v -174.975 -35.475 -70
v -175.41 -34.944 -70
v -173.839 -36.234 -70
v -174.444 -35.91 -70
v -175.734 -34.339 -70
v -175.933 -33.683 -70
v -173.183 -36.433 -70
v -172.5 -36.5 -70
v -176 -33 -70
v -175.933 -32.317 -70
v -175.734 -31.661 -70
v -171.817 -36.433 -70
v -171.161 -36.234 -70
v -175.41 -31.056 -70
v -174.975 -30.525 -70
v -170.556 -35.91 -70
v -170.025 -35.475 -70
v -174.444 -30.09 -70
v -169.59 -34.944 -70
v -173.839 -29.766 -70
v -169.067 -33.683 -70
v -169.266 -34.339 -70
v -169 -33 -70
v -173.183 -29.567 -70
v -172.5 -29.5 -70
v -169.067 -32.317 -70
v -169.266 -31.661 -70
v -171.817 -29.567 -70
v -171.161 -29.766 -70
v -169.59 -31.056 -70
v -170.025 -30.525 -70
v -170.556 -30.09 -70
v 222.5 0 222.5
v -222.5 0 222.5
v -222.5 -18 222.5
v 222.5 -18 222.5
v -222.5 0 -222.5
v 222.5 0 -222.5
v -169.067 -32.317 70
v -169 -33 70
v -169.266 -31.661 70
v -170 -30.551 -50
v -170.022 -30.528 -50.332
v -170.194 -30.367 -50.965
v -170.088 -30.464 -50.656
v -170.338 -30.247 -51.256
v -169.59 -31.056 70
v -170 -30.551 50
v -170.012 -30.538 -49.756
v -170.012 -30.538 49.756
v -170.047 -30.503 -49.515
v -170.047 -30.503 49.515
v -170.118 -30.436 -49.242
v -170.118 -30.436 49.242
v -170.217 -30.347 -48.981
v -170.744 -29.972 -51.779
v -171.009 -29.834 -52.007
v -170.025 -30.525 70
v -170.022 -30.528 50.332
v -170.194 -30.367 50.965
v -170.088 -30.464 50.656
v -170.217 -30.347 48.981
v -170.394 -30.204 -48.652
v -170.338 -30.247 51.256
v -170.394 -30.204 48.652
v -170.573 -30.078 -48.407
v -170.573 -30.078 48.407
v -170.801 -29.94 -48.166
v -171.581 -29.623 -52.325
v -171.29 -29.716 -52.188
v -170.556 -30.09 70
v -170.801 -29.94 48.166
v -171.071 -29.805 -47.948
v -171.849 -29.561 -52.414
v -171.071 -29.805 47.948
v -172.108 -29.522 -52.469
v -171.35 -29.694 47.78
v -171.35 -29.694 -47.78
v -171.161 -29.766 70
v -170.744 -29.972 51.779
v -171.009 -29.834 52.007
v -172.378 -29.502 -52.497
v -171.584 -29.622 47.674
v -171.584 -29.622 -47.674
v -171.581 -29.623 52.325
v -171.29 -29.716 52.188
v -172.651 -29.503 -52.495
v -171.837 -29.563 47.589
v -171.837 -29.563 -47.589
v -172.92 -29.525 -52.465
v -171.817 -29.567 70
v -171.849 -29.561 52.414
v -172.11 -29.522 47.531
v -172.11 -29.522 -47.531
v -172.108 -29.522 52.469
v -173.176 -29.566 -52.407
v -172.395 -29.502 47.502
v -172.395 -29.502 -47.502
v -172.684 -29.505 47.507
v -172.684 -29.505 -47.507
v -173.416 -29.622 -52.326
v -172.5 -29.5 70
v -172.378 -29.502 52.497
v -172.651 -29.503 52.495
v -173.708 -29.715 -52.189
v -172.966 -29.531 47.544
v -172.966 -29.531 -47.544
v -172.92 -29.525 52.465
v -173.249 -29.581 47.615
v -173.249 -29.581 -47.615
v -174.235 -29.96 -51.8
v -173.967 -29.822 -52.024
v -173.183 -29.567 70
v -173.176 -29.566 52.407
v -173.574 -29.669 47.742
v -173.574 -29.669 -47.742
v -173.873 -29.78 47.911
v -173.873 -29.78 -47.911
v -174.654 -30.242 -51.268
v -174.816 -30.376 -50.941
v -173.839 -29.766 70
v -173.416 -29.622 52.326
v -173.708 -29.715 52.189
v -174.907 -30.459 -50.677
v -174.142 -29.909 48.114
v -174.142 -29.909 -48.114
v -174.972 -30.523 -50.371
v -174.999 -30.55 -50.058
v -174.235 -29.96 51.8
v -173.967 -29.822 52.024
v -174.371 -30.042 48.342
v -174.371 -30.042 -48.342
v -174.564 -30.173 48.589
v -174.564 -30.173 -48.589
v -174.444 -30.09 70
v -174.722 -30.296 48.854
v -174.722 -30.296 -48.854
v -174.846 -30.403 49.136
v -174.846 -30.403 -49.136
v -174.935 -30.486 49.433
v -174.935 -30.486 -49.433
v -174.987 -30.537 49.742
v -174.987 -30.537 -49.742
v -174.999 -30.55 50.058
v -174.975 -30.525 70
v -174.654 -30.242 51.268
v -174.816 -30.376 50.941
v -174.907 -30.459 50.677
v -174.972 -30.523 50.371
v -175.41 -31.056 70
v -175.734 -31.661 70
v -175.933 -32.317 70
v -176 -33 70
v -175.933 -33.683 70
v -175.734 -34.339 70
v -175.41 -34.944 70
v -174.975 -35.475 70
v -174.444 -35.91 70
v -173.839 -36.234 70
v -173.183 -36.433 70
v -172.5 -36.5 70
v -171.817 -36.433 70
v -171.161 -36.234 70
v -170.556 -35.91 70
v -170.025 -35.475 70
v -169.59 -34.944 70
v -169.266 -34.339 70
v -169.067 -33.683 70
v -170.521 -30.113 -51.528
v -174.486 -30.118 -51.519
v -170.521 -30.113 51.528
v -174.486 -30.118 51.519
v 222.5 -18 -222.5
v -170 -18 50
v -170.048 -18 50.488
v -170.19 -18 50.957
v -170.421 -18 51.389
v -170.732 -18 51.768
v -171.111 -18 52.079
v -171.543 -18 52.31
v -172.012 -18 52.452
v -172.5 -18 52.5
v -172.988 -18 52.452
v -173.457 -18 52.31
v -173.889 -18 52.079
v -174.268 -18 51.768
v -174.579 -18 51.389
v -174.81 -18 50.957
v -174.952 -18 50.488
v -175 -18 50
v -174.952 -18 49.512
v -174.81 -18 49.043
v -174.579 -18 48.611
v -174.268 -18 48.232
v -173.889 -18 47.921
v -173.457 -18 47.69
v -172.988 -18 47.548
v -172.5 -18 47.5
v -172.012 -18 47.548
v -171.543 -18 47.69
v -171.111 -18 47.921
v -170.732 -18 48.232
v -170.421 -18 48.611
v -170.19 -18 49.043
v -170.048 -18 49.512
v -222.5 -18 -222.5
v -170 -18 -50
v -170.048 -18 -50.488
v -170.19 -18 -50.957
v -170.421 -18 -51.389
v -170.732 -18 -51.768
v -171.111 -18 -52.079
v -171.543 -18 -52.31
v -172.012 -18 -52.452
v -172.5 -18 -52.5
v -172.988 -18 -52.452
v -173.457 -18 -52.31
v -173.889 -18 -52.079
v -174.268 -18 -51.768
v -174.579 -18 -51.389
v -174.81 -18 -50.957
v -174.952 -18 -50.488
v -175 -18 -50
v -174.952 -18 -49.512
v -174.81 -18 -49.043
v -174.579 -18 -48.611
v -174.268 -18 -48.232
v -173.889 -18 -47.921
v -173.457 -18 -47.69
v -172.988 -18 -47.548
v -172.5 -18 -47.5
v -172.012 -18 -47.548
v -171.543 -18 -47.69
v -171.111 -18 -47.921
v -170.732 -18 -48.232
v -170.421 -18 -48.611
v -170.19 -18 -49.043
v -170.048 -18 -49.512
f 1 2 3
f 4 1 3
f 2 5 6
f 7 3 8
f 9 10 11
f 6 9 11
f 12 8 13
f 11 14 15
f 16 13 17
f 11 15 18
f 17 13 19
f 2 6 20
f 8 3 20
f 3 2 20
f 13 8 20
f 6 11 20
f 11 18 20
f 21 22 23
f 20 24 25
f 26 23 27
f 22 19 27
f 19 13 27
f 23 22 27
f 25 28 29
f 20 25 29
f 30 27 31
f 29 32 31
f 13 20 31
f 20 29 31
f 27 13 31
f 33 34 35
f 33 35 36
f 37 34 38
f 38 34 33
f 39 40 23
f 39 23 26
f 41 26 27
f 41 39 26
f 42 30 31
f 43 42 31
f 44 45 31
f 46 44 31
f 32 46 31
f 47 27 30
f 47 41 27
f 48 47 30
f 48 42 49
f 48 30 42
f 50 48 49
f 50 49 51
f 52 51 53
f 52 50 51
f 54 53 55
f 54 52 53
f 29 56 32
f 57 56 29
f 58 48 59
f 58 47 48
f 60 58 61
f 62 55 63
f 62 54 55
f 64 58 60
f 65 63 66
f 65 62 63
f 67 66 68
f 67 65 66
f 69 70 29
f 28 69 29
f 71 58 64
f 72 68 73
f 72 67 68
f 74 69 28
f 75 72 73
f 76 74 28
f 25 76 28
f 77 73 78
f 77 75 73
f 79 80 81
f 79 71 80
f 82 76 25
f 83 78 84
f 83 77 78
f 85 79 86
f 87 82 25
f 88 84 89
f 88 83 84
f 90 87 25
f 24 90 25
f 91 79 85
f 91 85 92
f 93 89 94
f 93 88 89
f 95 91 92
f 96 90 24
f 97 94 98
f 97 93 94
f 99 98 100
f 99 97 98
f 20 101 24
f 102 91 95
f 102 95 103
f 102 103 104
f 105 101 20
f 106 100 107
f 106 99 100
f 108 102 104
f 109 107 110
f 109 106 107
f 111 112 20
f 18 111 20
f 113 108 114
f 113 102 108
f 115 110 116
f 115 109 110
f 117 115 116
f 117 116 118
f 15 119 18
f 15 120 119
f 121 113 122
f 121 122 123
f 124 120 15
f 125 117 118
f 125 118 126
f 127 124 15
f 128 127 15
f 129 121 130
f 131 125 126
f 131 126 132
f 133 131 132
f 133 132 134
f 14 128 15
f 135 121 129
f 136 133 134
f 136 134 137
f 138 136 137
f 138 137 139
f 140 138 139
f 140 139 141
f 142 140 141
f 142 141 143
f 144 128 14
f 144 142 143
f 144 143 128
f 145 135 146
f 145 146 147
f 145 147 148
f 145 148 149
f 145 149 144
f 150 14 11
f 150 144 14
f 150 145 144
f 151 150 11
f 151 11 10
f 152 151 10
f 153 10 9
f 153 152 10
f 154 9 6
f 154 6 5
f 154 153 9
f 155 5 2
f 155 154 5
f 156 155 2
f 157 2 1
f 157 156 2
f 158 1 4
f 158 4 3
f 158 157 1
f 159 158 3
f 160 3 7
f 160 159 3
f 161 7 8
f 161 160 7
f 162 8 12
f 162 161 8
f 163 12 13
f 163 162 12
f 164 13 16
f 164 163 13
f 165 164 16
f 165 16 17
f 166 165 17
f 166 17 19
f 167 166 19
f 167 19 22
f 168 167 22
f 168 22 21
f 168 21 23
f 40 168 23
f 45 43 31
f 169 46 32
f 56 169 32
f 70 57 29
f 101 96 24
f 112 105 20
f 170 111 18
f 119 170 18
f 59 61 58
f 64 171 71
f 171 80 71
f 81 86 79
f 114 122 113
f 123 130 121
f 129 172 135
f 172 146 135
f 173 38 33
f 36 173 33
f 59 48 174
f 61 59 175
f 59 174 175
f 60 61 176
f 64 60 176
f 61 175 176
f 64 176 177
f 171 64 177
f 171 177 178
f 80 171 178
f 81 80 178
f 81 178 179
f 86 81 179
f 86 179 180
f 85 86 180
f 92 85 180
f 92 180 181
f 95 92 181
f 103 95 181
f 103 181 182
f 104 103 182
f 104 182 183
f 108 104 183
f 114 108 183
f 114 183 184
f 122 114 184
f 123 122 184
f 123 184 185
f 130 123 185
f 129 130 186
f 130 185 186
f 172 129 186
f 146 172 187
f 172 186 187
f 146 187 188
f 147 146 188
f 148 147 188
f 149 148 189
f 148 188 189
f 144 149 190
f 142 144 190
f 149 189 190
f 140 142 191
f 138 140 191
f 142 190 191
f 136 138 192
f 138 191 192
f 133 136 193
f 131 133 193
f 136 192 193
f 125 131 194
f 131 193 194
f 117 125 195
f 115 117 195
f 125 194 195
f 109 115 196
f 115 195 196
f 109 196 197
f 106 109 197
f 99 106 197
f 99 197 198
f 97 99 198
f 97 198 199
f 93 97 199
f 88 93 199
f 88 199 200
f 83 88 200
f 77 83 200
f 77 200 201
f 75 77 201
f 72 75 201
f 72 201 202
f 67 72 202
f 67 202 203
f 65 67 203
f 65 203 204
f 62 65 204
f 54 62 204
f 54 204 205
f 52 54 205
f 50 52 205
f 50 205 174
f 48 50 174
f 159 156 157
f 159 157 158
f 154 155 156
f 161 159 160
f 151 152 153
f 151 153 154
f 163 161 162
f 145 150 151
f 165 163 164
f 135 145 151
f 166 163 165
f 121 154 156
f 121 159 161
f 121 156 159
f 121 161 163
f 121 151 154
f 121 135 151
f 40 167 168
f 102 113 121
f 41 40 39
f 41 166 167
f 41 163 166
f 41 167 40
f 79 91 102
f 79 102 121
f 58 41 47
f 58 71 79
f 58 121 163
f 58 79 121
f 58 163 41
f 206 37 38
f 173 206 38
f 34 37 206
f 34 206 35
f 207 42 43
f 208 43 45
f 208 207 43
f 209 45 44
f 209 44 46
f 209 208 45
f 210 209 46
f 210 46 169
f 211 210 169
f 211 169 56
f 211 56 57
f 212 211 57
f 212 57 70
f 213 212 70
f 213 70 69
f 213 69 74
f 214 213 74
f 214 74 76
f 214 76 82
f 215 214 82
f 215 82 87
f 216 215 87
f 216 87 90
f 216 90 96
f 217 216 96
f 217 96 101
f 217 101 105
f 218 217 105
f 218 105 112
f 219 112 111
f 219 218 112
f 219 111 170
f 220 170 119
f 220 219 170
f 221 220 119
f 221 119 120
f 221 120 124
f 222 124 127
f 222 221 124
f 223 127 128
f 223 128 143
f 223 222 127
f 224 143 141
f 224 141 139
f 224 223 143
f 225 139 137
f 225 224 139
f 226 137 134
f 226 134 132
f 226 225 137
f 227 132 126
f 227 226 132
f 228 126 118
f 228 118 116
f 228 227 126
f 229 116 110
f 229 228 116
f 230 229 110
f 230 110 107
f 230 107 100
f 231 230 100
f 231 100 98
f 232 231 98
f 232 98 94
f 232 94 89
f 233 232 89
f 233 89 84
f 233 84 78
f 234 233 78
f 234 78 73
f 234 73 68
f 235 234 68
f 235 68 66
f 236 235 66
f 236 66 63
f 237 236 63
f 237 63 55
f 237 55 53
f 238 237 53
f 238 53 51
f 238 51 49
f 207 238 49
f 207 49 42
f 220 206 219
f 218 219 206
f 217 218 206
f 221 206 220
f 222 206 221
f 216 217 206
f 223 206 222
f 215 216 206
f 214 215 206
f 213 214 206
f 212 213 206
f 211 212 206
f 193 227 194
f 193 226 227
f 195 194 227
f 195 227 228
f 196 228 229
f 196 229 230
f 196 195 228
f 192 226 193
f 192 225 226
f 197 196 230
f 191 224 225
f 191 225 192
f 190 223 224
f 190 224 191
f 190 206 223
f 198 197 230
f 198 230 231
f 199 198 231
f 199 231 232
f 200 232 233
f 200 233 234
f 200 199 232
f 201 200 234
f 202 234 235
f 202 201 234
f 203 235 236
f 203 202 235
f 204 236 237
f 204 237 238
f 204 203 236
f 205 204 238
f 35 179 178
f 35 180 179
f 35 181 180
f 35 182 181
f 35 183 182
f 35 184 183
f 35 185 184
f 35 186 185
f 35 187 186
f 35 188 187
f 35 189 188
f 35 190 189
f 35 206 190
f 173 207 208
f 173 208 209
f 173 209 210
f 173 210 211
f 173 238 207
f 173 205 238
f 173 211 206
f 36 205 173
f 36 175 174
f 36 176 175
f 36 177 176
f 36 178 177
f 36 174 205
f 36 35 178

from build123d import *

# Parameters (mm, degrees)
F0_W     = 445
F0_H     = 445
F1_DEPTH = 18
F2_R     = 2.5
F3_DEPTH = 15
F4_R     = 3.5
F5_DEPTH = 70


# Not quite as in the source:
# - a pattern or mirror of a feature is missing from the dataset's text; its kind, count and spacing are read off the source's solid


with BuildPart() as f1:
    # F0 (on Front) → F1 (new body)
    with BuildSketch(Plane.XZ):
        Rectangle(F0_W, F0_H)
    extrude(amount=F1_DEPTH)

    # F2 (on face) → F3 (join)
    with BuildSketch(Plane.XZ.offset(18)):
        with Locations((-172.5, 50)):
            Circle(F2_R)
    f3 = extrude(amount=F3_DEPTH)

    # F3_copies: F3 across plane
    add(f3.mirror(Plane(origin=(0, 0, -1e-05), x_dir=(-1, 0, 0), z_dir=(0, 0, -1))))

    # F4 (on Top) → F5 (join, symmetric)
    with BuildSketch(Plane.XY):
        with Locations((-172.5, -33)):
            Circle(F4_R)
    extrude(amount=F5_DEPTH, both=True)


solid = f1.part
